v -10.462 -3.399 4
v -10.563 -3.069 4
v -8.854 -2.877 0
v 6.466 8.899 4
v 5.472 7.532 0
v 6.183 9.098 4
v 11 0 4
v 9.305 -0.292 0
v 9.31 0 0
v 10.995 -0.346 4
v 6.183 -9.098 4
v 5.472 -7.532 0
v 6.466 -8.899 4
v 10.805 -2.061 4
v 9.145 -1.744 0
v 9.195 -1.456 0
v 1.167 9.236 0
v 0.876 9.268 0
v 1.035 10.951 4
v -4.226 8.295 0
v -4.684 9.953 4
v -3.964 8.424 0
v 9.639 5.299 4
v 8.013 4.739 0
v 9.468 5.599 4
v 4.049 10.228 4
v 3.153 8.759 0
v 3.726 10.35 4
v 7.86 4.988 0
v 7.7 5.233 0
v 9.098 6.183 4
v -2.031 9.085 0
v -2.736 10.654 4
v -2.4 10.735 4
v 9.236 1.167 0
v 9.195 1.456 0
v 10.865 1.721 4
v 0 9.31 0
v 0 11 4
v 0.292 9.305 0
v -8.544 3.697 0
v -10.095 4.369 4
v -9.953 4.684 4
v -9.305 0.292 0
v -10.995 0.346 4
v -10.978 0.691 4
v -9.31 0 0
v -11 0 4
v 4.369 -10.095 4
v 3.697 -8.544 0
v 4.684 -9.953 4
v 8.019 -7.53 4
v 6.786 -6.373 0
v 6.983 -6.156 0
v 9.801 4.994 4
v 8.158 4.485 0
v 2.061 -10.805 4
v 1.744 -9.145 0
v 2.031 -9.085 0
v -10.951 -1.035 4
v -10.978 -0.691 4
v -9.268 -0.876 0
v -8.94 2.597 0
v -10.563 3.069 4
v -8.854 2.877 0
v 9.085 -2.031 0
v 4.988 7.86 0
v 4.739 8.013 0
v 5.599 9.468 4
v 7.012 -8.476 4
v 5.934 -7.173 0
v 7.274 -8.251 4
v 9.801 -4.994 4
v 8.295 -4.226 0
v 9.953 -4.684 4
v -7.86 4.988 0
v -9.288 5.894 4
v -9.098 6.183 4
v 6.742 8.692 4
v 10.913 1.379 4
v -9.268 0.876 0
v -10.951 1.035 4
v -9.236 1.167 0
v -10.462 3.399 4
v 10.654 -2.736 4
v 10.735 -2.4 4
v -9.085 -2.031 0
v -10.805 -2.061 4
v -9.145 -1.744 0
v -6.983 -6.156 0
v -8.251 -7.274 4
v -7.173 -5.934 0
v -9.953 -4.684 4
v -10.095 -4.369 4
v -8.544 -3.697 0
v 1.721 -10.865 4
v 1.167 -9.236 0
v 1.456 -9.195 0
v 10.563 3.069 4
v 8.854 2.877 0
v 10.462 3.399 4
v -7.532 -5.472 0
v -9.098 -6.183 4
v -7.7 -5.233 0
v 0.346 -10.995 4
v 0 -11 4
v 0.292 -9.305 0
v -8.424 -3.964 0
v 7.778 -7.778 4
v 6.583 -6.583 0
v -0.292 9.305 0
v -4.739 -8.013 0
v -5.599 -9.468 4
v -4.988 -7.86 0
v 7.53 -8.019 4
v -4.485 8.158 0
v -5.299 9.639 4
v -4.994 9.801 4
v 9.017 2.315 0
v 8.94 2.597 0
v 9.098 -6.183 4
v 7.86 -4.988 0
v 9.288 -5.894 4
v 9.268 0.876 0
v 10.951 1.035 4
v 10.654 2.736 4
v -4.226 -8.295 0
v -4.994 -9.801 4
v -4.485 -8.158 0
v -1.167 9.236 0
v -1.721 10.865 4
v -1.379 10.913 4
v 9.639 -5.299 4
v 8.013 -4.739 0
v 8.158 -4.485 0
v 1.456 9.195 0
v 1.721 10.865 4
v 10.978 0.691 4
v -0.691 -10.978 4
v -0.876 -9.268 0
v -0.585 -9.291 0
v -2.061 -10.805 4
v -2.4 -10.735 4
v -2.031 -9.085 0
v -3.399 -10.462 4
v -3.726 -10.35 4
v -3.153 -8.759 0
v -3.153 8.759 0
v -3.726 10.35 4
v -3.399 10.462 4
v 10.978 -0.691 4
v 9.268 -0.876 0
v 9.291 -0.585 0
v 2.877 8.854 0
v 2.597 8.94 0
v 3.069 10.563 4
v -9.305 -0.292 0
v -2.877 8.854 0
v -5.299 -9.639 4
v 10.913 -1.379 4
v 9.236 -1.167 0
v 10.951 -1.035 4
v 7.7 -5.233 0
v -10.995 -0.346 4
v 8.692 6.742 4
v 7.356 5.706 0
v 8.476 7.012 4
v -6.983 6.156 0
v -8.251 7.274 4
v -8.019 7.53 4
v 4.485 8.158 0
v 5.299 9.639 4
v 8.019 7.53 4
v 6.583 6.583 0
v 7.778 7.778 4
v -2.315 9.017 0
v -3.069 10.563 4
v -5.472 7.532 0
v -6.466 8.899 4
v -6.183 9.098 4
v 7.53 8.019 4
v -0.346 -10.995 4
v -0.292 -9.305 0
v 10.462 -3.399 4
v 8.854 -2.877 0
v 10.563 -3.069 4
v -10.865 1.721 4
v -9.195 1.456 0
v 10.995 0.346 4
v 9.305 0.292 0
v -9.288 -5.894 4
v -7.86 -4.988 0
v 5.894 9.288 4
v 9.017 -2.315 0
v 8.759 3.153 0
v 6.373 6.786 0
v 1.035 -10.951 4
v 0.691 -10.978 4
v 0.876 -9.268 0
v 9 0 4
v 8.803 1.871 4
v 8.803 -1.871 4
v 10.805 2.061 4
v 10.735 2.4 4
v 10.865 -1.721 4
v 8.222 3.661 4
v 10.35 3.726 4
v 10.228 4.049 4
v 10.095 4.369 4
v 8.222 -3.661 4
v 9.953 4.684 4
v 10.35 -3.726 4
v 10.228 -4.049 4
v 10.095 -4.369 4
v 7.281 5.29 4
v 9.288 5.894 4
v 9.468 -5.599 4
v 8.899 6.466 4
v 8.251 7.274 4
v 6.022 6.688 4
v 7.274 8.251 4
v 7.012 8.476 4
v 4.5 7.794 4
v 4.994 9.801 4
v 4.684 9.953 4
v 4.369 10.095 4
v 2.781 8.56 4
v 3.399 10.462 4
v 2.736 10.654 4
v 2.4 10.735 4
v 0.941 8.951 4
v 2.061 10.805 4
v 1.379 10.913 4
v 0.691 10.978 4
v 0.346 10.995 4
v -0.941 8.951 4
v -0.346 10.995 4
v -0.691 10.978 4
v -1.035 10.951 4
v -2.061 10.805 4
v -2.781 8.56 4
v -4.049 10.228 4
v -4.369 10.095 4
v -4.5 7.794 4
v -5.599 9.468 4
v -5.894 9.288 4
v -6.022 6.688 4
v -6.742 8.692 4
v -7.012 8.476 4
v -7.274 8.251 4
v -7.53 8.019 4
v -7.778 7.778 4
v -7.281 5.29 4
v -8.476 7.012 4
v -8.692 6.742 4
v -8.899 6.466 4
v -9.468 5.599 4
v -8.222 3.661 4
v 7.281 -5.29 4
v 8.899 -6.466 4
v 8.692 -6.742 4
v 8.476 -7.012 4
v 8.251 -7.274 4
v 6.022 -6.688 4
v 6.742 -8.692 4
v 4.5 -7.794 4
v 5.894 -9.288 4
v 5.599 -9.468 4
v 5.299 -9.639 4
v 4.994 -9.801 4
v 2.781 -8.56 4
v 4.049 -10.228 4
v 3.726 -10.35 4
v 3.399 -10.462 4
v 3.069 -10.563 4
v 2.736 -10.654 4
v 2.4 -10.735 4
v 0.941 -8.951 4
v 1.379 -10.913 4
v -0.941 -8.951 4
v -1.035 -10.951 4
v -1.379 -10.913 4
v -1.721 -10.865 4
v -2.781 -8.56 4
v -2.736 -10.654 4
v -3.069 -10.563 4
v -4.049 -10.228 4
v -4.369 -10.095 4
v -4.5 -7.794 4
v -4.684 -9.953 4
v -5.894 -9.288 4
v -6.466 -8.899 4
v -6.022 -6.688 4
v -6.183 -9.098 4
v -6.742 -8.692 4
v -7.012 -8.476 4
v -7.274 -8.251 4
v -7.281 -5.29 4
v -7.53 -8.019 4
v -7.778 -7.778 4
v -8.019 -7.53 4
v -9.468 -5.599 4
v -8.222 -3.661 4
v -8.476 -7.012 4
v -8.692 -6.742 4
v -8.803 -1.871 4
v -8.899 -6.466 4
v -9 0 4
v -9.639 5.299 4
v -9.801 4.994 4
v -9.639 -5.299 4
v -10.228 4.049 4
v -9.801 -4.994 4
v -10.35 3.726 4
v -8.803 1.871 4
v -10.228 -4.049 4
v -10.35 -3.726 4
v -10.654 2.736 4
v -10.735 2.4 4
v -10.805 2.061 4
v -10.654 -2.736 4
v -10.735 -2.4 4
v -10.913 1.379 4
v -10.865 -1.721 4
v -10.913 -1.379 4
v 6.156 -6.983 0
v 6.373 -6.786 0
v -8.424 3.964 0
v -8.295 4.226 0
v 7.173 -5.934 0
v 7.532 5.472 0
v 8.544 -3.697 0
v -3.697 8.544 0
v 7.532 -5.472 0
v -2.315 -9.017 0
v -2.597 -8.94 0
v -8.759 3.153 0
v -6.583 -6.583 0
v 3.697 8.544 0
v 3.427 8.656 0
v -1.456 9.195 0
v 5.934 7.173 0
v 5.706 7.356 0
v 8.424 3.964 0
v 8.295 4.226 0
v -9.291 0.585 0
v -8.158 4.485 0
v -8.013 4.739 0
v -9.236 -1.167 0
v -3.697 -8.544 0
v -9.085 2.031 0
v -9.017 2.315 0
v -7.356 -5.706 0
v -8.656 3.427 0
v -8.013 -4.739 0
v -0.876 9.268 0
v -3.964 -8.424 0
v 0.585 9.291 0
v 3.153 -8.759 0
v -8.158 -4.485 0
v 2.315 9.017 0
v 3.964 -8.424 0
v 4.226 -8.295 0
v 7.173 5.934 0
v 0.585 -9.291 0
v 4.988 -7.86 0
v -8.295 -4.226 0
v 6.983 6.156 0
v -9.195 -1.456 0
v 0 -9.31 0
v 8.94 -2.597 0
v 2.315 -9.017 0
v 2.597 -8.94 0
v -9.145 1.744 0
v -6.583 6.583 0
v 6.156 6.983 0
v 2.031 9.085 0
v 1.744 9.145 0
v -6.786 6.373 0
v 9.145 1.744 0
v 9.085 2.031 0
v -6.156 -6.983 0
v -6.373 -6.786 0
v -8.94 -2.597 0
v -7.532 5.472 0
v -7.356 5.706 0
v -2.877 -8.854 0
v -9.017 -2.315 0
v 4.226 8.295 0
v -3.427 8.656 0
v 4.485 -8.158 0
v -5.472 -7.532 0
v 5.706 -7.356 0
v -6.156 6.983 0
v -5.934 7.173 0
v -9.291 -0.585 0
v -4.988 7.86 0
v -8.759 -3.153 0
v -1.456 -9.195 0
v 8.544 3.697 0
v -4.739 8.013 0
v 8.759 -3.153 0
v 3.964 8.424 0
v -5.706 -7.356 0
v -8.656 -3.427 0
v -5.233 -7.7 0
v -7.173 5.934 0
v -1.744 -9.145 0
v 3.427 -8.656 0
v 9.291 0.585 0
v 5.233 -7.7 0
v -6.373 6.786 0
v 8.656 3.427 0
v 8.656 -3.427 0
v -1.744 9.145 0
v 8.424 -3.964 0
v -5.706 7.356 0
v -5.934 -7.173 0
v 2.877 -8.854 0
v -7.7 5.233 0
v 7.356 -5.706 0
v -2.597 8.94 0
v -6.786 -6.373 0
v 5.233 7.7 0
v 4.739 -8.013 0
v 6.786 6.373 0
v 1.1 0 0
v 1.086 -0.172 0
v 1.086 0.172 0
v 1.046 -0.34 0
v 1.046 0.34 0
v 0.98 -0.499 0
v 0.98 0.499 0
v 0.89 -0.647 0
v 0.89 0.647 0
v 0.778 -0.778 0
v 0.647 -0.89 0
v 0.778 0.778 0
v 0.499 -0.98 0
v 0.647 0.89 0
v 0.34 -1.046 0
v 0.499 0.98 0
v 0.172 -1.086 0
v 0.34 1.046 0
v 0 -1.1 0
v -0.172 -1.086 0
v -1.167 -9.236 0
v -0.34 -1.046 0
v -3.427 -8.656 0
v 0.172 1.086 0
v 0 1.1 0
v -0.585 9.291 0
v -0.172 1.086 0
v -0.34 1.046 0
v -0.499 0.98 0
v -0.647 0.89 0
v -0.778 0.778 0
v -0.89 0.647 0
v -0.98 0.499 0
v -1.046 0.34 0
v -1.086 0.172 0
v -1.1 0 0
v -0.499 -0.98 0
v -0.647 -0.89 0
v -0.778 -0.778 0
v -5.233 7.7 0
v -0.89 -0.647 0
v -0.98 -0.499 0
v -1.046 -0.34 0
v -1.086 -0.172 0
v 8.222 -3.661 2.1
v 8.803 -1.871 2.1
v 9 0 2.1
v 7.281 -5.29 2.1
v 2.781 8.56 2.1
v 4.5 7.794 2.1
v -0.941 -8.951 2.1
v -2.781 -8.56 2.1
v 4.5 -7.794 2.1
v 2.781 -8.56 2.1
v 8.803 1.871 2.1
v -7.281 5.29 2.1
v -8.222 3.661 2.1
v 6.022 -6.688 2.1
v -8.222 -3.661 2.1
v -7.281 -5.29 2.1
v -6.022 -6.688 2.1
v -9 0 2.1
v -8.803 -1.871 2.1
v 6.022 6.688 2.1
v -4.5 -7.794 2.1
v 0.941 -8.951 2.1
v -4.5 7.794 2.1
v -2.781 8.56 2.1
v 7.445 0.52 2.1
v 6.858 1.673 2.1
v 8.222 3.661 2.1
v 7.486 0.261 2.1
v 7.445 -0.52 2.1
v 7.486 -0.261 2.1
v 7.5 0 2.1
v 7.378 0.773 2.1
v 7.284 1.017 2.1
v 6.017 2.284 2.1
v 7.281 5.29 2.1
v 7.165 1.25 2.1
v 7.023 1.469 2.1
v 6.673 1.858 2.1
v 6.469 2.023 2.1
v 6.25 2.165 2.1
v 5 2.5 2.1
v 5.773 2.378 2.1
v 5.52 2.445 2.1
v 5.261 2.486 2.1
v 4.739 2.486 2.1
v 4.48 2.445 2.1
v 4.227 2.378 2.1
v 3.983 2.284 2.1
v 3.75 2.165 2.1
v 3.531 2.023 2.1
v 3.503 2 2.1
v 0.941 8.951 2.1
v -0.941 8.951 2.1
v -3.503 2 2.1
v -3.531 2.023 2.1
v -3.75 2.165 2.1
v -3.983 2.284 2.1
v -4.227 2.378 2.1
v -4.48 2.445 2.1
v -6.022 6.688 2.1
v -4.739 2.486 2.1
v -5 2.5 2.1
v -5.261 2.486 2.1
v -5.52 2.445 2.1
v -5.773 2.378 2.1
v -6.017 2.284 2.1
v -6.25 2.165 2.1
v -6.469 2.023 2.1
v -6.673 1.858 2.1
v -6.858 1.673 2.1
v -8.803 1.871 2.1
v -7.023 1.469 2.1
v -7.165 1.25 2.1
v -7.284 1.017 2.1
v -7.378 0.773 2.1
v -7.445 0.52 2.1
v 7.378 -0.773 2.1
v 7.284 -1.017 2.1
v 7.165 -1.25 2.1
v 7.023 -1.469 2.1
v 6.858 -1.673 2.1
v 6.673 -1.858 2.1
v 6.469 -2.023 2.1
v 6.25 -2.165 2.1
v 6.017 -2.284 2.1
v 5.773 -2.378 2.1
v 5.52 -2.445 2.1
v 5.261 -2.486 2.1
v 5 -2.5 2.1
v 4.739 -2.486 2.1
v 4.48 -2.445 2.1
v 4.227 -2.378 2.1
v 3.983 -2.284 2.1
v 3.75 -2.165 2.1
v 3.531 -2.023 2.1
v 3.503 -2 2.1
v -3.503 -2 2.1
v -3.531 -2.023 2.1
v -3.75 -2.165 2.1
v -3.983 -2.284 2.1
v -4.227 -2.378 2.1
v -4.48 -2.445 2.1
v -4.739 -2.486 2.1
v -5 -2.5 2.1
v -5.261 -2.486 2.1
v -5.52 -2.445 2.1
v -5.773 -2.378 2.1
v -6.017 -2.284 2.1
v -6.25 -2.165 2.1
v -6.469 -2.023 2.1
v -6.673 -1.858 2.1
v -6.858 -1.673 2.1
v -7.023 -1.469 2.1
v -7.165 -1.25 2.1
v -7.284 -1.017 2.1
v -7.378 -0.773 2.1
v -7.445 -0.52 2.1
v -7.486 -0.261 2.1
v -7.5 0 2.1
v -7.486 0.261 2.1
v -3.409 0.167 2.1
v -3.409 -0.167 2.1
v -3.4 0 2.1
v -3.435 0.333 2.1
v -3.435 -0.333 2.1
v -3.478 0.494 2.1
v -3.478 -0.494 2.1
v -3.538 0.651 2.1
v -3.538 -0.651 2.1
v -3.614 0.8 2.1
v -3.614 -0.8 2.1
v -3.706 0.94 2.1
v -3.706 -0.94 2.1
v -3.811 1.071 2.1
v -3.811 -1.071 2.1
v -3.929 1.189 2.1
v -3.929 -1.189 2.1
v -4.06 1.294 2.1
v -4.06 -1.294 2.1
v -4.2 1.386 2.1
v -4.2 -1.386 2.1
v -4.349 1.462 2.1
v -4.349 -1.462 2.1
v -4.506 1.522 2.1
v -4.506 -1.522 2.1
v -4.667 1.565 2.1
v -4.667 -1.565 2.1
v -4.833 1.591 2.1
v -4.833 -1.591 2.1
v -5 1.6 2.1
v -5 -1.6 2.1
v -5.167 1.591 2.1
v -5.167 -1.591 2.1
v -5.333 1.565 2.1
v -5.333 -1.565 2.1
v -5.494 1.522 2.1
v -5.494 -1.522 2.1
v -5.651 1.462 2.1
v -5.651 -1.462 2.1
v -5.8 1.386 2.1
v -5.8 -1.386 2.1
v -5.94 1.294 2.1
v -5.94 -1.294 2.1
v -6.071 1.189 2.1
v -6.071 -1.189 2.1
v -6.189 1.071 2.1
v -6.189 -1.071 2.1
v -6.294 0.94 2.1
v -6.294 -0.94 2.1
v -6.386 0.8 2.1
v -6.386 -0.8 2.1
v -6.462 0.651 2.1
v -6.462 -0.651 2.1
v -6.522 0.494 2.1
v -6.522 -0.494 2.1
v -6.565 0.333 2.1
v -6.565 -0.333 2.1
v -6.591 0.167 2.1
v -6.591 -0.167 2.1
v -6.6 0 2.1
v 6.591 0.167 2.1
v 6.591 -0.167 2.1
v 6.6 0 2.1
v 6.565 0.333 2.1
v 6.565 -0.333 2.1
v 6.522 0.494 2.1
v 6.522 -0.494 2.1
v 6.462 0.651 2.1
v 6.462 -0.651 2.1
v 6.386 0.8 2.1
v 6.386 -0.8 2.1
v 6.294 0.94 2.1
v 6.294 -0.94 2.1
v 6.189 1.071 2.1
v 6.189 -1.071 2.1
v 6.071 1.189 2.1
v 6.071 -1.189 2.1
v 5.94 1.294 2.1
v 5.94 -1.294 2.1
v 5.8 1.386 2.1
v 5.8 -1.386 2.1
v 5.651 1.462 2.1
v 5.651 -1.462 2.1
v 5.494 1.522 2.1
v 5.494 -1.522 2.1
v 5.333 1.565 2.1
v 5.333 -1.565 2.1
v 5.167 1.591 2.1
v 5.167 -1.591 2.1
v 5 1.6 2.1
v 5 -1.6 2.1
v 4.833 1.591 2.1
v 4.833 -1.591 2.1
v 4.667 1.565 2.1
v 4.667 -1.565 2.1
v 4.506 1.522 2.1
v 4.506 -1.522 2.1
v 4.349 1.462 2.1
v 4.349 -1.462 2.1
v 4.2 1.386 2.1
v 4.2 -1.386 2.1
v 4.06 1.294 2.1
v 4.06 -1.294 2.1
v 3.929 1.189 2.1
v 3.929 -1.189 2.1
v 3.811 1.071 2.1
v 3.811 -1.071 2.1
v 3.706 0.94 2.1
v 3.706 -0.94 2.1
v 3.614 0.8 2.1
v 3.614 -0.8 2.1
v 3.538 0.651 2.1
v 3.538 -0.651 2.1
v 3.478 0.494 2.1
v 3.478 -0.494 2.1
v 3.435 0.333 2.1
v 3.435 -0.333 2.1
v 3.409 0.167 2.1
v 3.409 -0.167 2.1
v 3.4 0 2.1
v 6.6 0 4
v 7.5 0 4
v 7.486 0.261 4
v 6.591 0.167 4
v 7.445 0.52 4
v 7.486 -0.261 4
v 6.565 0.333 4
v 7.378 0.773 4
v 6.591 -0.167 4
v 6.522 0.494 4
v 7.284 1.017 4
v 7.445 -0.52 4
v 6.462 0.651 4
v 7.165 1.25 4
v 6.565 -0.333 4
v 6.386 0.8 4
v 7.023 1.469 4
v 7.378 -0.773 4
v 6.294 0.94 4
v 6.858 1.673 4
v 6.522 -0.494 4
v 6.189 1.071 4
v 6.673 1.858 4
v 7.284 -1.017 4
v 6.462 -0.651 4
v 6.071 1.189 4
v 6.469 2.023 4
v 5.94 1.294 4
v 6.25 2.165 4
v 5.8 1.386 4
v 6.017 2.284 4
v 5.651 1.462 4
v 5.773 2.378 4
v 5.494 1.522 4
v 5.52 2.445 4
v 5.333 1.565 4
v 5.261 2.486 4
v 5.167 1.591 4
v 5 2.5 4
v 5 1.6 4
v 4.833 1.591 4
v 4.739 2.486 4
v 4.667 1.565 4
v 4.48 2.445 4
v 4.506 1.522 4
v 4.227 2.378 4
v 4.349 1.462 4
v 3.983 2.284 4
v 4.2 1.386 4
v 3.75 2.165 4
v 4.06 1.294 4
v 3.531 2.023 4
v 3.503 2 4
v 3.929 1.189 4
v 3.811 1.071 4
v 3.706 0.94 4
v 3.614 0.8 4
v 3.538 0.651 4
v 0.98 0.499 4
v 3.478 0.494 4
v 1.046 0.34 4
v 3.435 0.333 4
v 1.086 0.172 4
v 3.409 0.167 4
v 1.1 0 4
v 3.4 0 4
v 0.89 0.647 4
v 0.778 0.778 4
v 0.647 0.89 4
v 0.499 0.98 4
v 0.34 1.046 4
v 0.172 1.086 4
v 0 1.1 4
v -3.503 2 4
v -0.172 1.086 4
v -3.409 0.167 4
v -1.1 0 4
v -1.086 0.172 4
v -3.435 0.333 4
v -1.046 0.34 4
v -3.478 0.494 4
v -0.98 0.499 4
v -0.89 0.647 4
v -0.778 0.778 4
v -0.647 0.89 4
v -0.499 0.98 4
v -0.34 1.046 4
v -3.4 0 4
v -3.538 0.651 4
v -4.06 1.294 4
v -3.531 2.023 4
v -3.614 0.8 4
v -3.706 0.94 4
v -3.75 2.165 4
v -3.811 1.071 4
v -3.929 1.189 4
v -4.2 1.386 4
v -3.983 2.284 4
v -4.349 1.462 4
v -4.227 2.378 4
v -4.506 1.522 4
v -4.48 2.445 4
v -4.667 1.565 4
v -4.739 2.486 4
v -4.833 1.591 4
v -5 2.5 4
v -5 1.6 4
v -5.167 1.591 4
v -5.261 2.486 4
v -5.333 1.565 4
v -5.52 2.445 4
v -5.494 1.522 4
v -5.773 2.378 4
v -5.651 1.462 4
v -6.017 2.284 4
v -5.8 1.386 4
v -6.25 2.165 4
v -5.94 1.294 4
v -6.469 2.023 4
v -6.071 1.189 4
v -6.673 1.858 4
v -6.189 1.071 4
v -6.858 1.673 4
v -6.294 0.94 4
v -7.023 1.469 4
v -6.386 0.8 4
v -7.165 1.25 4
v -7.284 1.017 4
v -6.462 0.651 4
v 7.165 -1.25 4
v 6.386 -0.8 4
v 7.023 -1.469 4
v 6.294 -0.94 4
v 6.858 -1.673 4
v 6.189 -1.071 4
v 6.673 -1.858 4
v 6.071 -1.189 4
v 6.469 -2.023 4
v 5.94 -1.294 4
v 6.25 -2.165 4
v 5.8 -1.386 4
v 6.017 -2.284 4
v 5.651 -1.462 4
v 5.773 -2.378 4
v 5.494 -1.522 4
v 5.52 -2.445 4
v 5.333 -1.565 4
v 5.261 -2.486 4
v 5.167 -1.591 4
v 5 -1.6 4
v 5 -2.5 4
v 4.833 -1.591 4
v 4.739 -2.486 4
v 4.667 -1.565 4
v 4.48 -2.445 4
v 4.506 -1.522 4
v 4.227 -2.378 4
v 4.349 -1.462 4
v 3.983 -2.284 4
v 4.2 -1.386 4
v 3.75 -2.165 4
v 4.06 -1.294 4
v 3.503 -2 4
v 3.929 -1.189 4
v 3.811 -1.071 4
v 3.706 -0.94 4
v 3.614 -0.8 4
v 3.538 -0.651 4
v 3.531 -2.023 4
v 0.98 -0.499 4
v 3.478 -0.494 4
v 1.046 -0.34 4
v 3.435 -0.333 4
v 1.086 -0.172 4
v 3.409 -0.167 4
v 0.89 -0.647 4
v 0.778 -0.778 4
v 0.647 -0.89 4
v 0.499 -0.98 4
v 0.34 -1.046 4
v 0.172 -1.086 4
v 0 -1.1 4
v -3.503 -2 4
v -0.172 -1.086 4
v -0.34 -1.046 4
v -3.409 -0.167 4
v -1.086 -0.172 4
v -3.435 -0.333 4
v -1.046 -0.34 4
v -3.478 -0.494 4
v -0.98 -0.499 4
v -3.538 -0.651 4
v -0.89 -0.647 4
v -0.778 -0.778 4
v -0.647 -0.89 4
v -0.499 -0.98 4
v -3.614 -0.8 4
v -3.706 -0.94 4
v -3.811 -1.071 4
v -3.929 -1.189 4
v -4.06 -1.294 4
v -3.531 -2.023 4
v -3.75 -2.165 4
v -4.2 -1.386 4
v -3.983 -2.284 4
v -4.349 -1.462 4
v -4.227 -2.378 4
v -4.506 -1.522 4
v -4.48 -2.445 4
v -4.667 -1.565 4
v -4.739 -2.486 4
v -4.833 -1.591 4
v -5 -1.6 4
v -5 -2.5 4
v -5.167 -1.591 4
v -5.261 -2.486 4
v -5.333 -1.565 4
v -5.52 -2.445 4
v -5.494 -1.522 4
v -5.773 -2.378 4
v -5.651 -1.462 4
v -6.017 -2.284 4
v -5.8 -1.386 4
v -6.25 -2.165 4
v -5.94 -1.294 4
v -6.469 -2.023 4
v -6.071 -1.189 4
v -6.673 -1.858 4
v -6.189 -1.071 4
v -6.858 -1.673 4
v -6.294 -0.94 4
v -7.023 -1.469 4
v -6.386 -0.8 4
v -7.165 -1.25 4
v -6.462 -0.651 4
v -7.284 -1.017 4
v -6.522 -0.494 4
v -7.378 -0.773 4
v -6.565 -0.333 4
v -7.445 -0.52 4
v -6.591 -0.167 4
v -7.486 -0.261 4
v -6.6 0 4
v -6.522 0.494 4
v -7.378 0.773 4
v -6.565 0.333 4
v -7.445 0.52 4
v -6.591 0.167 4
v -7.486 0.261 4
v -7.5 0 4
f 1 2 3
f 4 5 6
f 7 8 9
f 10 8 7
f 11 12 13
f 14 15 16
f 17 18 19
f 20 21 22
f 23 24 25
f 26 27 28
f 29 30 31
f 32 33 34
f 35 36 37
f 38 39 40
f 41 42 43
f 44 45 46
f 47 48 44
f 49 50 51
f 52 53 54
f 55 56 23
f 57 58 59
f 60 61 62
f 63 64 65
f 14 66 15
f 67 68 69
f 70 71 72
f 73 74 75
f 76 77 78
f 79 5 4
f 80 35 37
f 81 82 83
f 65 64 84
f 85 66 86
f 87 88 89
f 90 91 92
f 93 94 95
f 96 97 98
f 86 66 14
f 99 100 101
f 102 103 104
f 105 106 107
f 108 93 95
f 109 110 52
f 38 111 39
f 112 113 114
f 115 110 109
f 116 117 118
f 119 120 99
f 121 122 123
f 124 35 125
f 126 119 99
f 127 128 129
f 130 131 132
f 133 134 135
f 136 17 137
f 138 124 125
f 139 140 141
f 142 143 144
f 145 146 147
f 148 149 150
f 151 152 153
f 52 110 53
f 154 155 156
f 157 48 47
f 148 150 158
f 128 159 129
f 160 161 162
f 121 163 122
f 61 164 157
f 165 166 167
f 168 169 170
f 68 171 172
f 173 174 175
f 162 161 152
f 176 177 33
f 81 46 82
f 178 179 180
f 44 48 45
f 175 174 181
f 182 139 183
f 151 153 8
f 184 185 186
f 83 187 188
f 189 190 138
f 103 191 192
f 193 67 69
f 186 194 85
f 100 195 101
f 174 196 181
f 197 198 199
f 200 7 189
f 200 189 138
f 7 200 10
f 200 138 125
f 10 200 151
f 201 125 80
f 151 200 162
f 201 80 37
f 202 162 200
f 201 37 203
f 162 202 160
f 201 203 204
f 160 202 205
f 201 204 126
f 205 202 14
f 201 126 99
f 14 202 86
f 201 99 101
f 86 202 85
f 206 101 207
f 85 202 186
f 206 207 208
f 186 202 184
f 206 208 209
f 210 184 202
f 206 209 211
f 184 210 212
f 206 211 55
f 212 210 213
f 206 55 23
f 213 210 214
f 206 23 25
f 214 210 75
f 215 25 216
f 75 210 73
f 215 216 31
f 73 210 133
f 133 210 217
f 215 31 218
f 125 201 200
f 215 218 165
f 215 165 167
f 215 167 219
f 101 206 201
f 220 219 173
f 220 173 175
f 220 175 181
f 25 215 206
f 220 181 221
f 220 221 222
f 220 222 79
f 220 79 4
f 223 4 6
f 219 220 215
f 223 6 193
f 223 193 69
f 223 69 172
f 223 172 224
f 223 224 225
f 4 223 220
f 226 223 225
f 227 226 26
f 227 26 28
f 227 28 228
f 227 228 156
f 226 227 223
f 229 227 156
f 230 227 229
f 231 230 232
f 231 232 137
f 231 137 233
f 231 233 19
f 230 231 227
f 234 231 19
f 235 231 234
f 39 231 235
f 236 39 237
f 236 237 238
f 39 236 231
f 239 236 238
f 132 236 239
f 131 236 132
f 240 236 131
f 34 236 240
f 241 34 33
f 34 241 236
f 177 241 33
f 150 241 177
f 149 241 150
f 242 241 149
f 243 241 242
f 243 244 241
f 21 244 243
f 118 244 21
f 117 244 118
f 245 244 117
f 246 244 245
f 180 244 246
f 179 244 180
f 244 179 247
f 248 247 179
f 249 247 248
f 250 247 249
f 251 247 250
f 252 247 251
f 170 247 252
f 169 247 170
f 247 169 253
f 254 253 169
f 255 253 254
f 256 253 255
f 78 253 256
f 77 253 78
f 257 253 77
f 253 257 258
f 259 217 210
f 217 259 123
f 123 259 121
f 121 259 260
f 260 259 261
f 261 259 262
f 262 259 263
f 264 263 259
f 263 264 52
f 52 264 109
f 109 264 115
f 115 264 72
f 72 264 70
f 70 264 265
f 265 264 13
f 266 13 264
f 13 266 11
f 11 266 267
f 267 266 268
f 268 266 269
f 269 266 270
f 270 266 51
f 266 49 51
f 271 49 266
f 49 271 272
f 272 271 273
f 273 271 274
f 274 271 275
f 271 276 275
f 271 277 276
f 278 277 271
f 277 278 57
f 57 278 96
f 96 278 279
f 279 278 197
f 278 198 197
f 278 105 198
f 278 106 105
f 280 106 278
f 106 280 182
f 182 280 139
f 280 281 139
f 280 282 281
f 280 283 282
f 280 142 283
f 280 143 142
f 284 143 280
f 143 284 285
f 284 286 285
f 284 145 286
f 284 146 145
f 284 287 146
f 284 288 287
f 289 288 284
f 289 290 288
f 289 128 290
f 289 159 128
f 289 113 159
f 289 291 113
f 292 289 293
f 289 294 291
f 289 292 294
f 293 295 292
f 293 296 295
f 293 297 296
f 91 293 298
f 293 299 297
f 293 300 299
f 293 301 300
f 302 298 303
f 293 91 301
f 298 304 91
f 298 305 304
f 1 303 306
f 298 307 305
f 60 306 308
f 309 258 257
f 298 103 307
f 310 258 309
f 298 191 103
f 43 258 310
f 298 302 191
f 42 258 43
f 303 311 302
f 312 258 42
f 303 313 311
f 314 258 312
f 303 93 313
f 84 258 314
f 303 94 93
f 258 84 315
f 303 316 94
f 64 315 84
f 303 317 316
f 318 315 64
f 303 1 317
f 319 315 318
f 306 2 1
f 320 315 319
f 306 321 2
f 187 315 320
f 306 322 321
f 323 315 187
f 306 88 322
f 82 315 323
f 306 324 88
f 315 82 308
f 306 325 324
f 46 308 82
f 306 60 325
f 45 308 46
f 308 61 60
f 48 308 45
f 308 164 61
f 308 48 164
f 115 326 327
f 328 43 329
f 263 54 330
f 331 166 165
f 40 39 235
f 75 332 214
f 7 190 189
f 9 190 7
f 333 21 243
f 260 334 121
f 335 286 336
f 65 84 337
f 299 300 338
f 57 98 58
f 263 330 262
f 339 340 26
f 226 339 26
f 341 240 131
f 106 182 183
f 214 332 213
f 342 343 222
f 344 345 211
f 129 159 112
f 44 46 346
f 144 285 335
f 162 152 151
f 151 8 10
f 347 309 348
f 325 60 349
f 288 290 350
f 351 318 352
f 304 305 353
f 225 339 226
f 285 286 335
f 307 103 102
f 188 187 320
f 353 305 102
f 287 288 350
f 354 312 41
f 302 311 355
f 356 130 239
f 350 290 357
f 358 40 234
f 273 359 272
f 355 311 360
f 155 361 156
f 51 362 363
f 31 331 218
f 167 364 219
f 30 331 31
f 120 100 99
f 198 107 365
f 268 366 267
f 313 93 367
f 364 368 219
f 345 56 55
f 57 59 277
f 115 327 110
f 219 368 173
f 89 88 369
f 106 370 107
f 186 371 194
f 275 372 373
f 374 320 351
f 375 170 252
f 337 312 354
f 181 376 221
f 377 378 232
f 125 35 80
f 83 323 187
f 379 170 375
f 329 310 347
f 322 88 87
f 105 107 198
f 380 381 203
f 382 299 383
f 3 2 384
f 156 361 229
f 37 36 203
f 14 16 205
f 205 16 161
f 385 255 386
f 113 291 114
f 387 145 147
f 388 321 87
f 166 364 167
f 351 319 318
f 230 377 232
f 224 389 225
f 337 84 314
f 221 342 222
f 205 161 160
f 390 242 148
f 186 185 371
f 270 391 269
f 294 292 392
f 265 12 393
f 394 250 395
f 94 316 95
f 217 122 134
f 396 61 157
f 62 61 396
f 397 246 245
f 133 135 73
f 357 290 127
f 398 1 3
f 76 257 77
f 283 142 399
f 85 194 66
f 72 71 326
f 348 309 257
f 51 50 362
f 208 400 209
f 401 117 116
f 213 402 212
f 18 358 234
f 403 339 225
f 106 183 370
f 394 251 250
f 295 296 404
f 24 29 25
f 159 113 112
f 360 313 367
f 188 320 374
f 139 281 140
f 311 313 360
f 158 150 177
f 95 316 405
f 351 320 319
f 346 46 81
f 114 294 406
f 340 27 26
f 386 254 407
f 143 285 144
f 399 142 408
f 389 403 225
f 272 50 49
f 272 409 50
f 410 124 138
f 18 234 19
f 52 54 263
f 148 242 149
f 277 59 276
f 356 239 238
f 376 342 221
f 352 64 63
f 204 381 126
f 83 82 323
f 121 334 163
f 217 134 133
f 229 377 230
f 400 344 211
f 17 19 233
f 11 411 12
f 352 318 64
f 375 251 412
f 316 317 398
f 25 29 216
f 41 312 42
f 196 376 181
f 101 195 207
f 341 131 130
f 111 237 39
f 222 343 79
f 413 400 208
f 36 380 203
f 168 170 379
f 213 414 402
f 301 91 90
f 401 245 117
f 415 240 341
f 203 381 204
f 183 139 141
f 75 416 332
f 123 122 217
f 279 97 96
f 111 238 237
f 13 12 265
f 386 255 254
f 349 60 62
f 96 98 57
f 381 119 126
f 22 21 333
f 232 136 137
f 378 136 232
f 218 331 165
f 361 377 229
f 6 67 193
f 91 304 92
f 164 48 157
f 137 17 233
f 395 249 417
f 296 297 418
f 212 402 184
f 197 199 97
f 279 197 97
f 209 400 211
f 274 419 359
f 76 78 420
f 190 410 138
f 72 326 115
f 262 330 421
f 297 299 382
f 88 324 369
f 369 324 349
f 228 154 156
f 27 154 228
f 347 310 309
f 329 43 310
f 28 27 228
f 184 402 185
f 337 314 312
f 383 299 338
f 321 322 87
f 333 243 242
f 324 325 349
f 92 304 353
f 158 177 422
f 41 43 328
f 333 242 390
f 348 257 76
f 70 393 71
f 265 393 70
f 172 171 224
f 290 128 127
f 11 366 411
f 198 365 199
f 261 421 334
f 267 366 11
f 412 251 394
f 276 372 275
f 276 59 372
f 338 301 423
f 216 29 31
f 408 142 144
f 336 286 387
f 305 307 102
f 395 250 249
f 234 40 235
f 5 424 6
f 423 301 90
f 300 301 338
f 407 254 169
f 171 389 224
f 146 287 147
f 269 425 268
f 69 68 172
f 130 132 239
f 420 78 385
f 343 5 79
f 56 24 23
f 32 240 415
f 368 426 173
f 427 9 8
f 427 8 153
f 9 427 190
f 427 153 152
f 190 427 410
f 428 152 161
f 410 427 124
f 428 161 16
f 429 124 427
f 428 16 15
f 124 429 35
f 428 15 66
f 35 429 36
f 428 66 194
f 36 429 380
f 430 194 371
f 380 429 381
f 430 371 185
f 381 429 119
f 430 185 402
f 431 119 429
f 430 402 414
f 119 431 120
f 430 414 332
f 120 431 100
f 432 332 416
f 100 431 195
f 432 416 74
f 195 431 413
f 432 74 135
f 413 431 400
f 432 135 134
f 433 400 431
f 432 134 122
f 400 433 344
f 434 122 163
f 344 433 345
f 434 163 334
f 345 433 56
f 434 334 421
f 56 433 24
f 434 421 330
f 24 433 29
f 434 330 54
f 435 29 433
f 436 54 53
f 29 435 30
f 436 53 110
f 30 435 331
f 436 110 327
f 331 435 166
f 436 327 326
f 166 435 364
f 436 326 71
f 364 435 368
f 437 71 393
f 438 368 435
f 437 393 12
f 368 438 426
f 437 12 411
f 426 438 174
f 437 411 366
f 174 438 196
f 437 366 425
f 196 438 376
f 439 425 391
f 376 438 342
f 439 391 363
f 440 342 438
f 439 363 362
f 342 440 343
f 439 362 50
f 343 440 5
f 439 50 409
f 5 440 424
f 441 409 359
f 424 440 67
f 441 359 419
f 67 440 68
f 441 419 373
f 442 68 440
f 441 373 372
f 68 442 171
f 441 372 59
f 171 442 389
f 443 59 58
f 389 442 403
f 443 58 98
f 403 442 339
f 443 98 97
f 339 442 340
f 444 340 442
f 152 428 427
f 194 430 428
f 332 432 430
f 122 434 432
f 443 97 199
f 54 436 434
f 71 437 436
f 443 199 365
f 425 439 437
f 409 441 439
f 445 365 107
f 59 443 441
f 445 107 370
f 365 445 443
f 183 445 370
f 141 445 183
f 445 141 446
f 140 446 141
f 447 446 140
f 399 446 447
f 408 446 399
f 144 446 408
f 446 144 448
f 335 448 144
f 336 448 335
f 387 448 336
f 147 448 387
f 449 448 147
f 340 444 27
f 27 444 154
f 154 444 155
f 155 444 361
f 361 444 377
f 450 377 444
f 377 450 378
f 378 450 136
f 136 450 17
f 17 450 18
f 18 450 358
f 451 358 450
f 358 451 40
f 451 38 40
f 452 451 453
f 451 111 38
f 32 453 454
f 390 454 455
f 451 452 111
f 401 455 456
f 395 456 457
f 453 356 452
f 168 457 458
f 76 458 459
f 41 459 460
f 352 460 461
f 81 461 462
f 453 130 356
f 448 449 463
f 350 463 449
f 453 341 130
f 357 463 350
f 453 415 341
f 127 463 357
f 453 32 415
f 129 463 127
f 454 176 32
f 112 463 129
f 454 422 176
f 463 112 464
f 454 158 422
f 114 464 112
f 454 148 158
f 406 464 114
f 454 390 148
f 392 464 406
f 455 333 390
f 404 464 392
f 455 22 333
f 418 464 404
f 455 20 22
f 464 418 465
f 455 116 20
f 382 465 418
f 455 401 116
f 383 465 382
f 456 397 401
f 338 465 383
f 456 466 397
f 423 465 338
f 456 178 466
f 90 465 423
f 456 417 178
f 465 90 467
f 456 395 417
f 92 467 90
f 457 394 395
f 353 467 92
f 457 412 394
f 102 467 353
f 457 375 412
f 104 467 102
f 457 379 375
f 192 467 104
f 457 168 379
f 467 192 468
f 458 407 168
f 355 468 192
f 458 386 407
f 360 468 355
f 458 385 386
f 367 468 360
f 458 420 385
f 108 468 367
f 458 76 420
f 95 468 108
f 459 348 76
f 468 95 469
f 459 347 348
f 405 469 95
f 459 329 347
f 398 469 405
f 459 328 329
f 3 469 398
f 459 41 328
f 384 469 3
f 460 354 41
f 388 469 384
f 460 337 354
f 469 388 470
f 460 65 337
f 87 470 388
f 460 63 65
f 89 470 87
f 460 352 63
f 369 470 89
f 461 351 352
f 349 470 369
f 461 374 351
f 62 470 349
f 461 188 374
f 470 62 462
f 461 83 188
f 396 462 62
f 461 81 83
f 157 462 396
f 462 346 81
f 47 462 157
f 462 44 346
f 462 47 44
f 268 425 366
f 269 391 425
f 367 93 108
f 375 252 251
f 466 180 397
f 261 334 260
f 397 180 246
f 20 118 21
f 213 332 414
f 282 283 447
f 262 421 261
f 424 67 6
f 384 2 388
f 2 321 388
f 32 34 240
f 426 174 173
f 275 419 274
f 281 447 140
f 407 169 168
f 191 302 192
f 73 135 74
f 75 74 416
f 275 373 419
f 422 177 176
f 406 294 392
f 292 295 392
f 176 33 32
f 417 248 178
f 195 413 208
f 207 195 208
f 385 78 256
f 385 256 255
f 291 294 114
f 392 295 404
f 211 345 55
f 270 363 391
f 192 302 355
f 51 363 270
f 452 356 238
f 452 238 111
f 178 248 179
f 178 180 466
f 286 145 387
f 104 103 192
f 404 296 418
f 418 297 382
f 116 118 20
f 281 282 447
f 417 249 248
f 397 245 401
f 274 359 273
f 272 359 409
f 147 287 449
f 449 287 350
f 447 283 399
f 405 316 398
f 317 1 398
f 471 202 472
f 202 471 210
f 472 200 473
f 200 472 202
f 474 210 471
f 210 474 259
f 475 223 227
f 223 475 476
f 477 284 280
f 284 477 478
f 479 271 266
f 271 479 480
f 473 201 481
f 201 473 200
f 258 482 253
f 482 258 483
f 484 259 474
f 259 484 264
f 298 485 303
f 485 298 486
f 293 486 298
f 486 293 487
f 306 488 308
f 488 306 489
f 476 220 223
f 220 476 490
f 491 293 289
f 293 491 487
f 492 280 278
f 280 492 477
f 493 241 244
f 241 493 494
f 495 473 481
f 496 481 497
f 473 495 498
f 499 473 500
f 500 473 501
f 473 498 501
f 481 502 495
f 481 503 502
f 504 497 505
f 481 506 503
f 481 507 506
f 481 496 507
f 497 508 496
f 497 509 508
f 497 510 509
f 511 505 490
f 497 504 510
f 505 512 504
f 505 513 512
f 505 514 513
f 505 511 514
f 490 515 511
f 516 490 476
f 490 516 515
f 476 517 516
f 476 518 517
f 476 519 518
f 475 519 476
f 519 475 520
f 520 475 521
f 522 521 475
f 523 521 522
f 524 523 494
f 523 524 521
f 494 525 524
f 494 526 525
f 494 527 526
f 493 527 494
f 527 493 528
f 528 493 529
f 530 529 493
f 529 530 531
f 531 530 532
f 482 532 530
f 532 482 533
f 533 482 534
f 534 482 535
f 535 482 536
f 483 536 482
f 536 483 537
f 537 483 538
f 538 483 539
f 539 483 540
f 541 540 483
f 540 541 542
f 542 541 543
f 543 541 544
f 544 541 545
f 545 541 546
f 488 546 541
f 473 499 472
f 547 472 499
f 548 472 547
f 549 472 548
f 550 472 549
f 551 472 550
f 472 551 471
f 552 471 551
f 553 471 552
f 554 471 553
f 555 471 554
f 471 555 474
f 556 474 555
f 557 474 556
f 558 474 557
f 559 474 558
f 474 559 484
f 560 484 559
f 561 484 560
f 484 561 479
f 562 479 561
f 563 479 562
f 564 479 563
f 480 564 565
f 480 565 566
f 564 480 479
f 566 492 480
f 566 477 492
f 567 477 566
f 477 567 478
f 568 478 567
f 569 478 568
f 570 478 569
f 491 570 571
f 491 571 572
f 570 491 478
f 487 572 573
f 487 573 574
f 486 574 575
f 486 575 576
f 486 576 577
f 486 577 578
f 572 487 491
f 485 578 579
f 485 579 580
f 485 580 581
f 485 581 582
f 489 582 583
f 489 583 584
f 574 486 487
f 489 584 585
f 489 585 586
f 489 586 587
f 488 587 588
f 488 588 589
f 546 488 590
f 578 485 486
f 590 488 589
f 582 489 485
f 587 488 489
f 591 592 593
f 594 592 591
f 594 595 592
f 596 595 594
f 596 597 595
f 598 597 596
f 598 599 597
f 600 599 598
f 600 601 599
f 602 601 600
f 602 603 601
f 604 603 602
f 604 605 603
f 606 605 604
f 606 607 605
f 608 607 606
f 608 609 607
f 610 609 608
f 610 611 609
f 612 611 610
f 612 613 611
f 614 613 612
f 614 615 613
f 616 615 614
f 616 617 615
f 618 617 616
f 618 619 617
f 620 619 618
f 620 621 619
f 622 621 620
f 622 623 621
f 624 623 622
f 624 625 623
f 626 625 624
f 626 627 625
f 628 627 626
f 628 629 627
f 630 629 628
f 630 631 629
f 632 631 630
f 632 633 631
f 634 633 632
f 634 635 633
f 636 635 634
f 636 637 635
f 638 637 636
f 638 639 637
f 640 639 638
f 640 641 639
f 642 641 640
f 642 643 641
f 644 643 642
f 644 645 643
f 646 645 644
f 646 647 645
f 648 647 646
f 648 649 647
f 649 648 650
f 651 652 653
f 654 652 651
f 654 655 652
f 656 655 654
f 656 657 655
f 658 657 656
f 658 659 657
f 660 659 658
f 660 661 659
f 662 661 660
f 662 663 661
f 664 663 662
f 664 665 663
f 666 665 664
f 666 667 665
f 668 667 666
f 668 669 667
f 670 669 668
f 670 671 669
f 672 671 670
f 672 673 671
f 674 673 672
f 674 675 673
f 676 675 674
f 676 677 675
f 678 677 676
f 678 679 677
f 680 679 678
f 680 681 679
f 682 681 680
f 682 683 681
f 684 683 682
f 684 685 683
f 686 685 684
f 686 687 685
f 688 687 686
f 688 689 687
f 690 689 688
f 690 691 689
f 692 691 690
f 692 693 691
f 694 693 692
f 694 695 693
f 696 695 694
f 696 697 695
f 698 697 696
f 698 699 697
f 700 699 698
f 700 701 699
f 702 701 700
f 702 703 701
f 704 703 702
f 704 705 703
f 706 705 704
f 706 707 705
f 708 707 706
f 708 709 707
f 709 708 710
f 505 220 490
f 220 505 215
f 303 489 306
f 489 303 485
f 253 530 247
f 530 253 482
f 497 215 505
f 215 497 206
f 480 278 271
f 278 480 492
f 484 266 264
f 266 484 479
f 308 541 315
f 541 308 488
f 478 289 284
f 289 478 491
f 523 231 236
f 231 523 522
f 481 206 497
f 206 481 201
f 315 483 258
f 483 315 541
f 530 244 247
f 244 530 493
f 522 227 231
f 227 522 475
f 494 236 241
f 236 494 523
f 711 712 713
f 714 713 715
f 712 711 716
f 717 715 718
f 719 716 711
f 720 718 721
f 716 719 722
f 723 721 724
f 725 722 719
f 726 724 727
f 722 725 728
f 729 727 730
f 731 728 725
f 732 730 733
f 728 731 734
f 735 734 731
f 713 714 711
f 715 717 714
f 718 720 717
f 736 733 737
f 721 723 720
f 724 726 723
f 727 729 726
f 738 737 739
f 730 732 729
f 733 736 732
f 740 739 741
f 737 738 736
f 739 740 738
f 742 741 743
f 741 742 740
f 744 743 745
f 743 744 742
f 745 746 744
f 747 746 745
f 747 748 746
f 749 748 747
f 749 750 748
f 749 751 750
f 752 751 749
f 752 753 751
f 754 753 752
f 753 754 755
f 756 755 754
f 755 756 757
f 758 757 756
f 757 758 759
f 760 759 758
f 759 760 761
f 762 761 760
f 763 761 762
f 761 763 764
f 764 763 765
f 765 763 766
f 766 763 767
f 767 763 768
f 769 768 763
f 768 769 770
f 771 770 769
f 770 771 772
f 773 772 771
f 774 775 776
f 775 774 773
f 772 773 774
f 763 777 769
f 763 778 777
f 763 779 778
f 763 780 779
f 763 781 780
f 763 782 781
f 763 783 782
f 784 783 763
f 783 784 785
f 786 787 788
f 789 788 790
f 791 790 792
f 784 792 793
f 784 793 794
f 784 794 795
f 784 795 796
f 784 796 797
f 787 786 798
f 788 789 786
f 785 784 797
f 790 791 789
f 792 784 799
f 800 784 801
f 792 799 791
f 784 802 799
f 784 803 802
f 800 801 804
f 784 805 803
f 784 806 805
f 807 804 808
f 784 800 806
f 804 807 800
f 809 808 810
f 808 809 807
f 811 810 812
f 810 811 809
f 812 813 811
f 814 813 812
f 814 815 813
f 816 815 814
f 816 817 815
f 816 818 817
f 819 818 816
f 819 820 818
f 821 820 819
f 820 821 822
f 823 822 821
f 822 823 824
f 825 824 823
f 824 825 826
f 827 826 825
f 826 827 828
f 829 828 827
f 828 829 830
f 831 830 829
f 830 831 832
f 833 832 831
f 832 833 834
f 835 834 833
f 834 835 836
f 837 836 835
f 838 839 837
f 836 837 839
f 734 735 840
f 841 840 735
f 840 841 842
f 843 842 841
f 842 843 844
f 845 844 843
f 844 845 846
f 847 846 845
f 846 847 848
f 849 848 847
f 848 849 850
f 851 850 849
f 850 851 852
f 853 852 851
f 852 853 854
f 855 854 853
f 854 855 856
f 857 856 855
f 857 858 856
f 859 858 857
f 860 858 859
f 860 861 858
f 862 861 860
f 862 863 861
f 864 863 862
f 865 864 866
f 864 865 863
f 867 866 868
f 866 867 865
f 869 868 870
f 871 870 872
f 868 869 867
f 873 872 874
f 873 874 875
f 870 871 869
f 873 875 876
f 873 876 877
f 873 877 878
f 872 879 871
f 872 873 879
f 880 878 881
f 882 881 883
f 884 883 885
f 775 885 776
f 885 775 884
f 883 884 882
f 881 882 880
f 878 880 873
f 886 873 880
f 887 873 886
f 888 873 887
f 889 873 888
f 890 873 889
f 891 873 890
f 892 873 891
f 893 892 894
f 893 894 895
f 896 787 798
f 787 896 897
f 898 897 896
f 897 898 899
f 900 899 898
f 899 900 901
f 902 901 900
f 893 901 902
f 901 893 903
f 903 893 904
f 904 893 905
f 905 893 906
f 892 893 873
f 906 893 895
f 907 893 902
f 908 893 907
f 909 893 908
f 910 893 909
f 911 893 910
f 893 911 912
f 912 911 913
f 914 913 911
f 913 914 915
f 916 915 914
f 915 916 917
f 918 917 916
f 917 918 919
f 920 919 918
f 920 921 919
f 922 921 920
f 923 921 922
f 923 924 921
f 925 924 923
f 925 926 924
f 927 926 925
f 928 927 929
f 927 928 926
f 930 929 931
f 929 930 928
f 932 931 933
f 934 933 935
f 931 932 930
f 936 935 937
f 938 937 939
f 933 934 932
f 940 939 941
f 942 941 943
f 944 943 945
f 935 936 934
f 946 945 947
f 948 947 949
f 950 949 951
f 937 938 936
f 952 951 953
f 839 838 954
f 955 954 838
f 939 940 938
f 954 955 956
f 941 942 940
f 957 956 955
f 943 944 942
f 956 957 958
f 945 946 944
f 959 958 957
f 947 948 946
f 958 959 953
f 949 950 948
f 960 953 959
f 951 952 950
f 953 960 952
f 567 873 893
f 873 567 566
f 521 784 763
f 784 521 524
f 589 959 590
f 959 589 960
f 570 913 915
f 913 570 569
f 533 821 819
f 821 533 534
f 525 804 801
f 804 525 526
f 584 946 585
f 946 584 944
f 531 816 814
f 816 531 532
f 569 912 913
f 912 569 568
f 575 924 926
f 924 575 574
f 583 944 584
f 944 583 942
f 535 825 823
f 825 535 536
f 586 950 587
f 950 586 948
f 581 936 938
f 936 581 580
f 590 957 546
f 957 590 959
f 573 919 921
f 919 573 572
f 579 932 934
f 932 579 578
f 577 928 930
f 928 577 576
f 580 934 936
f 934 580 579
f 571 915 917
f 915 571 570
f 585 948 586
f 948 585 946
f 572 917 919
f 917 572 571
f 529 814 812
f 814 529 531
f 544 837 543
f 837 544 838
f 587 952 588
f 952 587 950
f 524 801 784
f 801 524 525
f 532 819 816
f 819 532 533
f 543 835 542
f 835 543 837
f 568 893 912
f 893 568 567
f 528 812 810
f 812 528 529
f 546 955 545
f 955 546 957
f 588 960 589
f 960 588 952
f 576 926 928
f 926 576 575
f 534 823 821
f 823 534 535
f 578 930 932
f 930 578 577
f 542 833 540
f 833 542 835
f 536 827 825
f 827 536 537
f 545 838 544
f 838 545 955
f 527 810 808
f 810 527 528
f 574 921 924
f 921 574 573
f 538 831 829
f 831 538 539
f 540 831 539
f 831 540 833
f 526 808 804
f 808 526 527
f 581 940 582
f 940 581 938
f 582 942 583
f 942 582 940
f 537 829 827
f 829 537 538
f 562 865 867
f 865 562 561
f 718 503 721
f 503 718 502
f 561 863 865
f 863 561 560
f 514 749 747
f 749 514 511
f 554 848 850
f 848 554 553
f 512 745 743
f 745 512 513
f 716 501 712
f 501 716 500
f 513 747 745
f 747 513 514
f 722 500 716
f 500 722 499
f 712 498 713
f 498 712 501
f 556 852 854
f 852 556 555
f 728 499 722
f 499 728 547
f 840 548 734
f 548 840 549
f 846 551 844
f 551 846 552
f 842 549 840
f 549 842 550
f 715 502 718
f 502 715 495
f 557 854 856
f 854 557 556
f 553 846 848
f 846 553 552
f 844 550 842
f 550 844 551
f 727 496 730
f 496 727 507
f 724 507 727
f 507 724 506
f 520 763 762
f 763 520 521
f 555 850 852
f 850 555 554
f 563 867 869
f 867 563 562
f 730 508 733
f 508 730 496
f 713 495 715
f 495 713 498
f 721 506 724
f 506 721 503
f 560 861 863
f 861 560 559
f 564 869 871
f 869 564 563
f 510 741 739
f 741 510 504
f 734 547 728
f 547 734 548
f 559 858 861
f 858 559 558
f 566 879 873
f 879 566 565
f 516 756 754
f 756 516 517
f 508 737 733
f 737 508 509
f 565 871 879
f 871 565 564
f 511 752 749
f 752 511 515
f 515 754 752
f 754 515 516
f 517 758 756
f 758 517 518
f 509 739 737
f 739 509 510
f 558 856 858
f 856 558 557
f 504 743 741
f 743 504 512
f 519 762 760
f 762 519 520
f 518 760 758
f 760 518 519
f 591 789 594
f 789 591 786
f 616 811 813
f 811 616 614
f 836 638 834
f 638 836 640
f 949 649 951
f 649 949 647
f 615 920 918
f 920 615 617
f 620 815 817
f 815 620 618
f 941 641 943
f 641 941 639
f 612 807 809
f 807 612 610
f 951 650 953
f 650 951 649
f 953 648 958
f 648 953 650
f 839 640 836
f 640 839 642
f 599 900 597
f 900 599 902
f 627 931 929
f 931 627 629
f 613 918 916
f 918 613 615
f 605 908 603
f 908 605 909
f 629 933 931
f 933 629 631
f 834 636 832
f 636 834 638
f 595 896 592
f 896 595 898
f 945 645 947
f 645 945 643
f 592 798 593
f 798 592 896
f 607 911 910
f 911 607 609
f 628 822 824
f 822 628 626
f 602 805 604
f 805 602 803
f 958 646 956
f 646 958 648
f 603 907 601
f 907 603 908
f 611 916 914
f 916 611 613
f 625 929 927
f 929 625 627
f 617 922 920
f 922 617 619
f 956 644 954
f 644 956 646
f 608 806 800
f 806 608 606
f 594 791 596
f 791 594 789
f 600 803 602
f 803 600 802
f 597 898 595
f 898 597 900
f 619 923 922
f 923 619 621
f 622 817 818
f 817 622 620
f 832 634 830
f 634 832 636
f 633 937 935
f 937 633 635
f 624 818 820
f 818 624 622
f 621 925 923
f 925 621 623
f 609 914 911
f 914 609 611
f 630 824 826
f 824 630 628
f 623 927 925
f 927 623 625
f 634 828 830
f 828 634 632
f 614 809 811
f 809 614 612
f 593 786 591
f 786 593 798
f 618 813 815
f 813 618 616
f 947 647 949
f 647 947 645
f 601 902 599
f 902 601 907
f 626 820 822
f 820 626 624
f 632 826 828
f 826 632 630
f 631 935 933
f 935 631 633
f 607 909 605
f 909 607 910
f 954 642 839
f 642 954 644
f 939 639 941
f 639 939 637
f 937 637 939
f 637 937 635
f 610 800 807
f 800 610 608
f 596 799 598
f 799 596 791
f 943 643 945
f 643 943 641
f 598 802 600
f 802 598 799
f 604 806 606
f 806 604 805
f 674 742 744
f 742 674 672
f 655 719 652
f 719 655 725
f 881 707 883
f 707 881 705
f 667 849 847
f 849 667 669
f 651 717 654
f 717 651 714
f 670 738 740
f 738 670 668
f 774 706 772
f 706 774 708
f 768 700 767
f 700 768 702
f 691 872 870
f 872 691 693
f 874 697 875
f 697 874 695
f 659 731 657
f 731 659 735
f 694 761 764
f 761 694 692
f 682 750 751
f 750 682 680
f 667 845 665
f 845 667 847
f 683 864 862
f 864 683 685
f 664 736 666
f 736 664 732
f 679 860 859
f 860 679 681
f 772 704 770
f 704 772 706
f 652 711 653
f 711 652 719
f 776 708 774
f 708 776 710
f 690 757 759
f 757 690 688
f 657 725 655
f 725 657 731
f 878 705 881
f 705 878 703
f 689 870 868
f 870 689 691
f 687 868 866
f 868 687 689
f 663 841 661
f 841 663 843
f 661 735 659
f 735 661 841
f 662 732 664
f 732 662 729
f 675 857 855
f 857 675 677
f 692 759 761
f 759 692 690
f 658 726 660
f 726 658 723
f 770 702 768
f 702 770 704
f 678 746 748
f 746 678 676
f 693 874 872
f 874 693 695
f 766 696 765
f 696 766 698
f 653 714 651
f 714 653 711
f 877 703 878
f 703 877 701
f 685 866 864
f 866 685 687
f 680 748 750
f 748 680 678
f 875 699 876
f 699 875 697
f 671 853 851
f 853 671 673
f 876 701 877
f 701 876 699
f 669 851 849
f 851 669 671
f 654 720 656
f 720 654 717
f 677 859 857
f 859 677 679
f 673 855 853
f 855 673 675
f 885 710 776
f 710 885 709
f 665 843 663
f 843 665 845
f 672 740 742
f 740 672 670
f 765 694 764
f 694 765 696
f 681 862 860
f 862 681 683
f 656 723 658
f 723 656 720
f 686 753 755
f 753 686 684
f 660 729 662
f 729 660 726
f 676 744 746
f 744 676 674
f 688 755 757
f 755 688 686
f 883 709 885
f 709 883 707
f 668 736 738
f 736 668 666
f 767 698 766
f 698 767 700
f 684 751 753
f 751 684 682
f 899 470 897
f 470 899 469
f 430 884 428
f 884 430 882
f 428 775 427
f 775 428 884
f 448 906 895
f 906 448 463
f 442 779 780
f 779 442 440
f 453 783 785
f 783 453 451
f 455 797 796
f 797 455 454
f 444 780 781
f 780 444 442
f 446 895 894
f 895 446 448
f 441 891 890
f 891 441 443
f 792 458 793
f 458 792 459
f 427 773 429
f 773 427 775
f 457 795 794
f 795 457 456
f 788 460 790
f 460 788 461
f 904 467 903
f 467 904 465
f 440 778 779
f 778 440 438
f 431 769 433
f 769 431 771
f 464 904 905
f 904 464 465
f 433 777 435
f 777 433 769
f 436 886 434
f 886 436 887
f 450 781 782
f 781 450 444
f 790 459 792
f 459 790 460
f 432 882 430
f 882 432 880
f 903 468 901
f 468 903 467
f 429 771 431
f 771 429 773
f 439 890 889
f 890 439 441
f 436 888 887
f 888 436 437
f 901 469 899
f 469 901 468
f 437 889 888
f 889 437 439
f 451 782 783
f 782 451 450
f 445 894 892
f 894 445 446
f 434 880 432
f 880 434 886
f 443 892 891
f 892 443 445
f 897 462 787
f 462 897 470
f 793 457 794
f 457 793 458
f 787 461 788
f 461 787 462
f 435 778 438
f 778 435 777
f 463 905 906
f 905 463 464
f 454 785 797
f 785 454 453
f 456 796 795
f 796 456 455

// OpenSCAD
// Customizable Miniature Base
// Created by Rob Ross, February 2014
//
// Shared under Creative Commons License: Attribution-ShareAlike 3.0 Unported (CC BY-SA 3.0) 
// see http://creativecommons.org/licenses/by-sa/3.0/
//
// Notes:
// - good: 40mm, num_x = 4, stone_offset = 2, master_seed=41, z_compression=1.1

// preview[view:south east, tilt:bottom]

/* [Base] */
// Width of base at the bottom (mm)
base_width = 22; // [25:60]
// Total height of base (mm)
base_height = 4; // [2:5]
// Angle of sidewall (0 degrees is vertical)
base_angle = 25;

have_topper = 0;
have_inset = 1;

/* [Hidden] */

/**** Main Routines ****/

translate([0,0, base_height]) rotate ([180,0,0]) 
{
   difference() {
      union() {
         difference() {
	    base_exterior();
            base_inset();
         }
         dogbone();
      }
      translate([0,0,-1]) cylinder(h=10,d=2.2,$fn=40); // 2mm flying post
   }
}

// base_exterior() - angled sides and top of base
module base_exterior()
{
      difference() {
         cylinder($fn=200, r1 = base_width / 2, 
                  r2 = base_width / 2 -  base_height *sin(base_angle),
                  h = base_height);
      }
}

module base_inset() {
   translate([0,0, -0.1])
      cylinder($fn=30,r=base_width/2-2,h=2);
}

module dogbone() {
   difference() {
      union() {
         // translate([-(base_width-10)/2,-1,0])  cube([base_width-10,2,base_height]);
         translate([-(base_width-10)/2,-2,0])  cube([base_width-10,4,base_height]);
         translate([-(base_width-12)/2,0,0]) cylinder($fn=60,d=5,h=base_height);
         translate([(base_width-12)/2,0,0]) cylinder($fn=60,d=5,h=base_height);
      }
      translate([-(base_width-12)/2,0,-0.1]) cylinder($fn=60,d=3.2,h=base_height+.1);
      translate([(base_width-12)/2,0,-0.1]) cylinder($fn=60,d=3.2,h=base_height+.1);
   }
}
